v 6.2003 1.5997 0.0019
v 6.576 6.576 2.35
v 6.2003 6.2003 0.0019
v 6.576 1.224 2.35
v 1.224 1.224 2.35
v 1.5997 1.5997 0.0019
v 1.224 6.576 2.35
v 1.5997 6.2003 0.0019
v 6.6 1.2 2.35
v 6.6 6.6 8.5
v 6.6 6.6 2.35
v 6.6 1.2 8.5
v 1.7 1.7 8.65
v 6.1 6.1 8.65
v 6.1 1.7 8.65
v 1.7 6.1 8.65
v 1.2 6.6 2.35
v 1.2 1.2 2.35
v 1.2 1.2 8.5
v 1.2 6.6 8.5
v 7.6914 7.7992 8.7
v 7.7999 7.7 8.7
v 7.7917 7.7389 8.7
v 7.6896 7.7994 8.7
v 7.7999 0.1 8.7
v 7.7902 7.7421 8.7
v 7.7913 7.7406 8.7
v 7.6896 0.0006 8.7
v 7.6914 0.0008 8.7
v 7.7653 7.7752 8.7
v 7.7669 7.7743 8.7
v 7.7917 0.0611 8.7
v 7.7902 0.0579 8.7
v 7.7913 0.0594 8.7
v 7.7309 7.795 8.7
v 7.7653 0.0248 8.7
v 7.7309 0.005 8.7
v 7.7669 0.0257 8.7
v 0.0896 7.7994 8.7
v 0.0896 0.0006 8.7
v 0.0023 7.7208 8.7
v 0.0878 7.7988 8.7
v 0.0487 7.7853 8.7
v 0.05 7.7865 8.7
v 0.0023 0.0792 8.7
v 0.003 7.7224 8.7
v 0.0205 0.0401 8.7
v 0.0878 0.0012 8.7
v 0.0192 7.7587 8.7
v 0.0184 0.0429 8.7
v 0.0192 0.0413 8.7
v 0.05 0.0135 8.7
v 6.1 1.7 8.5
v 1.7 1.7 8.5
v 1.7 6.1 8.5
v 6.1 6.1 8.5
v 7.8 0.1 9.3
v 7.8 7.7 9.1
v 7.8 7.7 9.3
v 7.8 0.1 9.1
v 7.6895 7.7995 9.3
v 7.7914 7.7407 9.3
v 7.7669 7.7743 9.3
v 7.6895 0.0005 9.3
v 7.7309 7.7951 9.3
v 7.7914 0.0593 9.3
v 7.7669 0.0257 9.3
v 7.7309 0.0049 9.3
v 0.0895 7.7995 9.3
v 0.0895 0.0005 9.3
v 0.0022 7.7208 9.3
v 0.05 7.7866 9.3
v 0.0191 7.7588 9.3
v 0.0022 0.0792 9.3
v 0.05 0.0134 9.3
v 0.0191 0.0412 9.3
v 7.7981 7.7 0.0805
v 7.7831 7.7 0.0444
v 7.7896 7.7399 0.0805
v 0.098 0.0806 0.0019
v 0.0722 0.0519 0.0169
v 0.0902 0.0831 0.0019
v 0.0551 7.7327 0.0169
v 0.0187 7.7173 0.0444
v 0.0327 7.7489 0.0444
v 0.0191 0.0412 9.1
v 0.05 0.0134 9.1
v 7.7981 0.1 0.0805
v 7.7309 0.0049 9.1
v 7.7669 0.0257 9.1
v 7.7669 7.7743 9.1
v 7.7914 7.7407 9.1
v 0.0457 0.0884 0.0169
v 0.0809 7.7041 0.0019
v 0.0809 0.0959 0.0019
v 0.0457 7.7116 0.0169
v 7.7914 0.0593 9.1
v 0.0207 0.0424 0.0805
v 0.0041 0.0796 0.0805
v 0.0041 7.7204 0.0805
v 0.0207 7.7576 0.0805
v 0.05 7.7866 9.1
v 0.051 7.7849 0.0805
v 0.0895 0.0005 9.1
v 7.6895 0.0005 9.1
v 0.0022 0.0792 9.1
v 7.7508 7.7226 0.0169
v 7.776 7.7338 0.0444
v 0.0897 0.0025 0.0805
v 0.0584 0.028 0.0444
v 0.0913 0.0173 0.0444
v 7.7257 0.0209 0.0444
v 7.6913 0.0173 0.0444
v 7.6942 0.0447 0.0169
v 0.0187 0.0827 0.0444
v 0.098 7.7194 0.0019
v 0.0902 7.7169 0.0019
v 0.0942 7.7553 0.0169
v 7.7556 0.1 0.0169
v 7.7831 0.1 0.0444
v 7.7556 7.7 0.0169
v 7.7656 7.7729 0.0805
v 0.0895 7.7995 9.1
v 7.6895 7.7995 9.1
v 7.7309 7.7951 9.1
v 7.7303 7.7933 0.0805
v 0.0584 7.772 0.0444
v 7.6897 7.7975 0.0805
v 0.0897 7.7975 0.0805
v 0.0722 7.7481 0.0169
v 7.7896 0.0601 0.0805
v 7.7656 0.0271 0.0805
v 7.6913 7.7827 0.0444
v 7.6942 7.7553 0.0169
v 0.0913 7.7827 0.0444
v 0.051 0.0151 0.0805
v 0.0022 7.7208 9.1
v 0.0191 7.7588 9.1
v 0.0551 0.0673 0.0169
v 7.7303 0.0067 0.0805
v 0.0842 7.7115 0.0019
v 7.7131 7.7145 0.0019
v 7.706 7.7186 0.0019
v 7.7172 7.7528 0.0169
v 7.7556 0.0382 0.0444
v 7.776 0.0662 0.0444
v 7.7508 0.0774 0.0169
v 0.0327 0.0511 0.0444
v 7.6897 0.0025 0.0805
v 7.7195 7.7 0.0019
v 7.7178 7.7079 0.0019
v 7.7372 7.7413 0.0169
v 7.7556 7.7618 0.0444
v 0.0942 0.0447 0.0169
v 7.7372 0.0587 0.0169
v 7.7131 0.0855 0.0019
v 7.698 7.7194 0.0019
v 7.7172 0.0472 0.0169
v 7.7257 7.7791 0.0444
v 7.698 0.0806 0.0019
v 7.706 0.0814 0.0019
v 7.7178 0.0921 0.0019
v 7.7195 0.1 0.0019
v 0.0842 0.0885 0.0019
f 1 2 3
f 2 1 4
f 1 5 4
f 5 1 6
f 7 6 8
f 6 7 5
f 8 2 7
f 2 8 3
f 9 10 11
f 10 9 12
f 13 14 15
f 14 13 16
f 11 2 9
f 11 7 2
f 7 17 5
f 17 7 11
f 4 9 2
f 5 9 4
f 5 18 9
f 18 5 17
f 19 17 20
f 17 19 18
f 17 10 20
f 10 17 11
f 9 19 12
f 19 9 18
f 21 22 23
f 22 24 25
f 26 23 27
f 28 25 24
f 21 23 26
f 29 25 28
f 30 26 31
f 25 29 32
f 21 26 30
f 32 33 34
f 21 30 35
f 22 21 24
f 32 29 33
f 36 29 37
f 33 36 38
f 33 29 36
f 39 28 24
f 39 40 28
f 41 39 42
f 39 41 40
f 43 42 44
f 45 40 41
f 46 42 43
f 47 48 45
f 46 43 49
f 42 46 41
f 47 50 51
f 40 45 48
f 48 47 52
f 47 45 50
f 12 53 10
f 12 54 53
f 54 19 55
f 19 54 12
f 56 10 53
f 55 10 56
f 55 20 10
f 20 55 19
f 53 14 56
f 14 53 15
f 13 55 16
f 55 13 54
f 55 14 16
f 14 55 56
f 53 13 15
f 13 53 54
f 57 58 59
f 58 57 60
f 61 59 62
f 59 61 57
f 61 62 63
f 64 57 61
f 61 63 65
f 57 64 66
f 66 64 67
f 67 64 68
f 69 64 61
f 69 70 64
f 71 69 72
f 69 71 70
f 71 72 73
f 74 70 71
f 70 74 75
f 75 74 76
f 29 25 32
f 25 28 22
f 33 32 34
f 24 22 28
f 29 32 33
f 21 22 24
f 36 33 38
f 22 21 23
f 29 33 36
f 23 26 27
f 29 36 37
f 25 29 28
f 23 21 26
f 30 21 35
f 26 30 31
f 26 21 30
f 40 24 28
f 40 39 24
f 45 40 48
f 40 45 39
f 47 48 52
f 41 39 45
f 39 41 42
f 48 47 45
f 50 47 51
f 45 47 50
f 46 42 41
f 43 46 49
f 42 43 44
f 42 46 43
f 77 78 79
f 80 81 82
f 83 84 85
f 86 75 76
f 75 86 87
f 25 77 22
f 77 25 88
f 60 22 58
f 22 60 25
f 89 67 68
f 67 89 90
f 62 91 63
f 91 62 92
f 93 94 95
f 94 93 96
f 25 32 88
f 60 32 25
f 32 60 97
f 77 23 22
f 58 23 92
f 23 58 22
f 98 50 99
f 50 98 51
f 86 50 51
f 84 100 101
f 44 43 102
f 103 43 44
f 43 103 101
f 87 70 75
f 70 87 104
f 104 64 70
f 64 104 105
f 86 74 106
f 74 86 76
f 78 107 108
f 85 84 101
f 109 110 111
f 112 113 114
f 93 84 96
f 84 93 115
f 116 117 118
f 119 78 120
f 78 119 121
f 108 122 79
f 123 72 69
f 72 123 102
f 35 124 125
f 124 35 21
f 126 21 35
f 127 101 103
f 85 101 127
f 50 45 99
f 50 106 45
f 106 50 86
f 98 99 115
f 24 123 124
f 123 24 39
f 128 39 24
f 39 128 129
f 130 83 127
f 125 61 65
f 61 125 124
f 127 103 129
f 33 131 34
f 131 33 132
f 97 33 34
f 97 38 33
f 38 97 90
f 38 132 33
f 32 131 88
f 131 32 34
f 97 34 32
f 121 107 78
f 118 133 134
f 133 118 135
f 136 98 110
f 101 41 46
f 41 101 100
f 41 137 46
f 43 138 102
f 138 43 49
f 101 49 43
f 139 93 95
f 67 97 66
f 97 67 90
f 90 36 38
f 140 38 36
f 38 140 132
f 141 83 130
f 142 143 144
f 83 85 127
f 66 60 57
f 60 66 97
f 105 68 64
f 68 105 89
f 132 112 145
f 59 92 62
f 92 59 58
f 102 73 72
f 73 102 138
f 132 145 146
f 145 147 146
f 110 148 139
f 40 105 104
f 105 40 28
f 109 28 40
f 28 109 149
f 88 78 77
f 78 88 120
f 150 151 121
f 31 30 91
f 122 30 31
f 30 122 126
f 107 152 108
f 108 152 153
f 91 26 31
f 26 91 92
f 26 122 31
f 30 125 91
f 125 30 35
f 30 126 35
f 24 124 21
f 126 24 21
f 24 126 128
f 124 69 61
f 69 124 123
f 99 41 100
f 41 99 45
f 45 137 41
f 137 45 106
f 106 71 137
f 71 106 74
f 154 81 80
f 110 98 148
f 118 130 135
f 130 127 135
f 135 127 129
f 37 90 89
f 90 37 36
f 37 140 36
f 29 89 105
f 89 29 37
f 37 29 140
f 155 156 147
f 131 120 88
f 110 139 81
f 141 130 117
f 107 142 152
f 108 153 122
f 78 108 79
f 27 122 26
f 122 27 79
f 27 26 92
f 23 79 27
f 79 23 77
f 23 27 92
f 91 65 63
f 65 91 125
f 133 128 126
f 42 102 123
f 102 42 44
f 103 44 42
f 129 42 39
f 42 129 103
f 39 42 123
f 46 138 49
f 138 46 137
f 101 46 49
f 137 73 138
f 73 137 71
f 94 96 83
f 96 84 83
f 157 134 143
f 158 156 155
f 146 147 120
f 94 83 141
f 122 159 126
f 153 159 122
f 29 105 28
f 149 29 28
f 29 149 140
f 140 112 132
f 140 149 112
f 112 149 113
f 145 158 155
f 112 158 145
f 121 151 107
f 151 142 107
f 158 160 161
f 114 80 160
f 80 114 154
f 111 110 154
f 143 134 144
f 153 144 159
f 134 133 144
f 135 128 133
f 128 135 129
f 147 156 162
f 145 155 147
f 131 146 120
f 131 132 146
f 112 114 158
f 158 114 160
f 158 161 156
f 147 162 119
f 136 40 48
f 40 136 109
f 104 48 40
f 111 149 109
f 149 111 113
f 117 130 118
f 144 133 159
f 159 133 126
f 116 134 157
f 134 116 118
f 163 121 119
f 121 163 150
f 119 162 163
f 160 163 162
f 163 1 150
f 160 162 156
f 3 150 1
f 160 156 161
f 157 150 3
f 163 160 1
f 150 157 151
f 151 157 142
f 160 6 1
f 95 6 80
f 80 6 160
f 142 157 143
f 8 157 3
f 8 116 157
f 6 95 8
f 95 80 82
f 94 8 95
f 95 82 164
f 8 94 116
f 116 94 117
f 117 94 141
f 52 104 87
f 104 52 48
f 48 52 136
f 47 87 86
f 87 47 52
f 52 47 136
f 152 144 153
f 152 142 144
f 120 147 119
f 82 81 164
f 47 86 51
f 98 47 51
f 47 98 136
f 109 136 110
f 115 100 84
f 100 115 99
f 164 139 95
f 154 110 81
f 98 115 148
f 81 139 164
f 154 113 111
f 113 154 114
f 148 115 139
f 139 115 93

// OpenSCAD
// file: ../../lib/brick-hollow.scad
/**
* Machine Blocks
* https://machinemania.net/blocks 
*
* Brick Hollow
* Copyright (c) 2022 Jan Philipp Knoeller <pk@pksoftware.de>
*
* Published under license:
* Creative Commons Attribution-NonCommercial-ShareAlike 4.0 International 
* https://creativecommons.org/licenses/by-nc-sa/4.0/
*
*/
echo(version=version());

module brickHollow(height=9.3, fade=2.5, minSize=[4.6,4.6], maxSize=[5.2, 5.2], center = false){
    echo(height, minSize, maxSize, fade);
    sizeX = max(minSize[0],maxSize[0]); 
   sizeY = max(minSize[1],maxSize[1]); 
    
    posX = center ? 0 : 0.5*sizeX; 
   posY = center ? 0 : 0.5*sizeY;   
   posZ = center ? -0.5 * (height-fade) : 0.5*fade;
    
    cutHelper = 0.2;
    overlapSpace=0.1;
    
    translate([posX, posY, posZ]){
        union(){
            polyhedron(points=[
                [-0.5*minSize[0],-0.5*minSize[1],-0.5*fade],
                [0.5*minSize[0],-0.5*minSize[1],-0.5*fade],
                [0.5*minSize[0],0.5*minSize[1],-0.5*fade],
                [-0.5*minSize[0],0.5*minSize[1],-0.5*fade],
                [-0.5*maxSize[0],-0.5*maxSize[1],0.5*fade],
                [0.5*maxSize[0],-0.5*maxSize[1],0.5*fade],
                [0.5*maxSize[0],0.5*maxSize[1],0.5*fade],
                [-0.5*maxSize[0],0.5*maxSize[1],0.5*fade]
            ], faces=[[0,1,2,3],[1,0,4,5],[2,1,5,6],[3,2,6,7],[0,3,7,4],[7,6,5,4]]);
            
            if(height > fade){
                translate([0,0,0.5*height - overlapSpace]){
                    cube([maxSize[0], maxSize[1], height - fade + overlapSpace], center=true);
                }
            }
            
            translate([0,0,-0.5*(fade + cutHelper) + overlapSpace]){
                cube([minSize[0], minSize[1], cutHelper + overlapSpace], center=true);
            }
        }
    }
}

//brickHollow(height=9.3, maxSize=[5.2,5.2], minSize=[4.6,4.6], center=true);
// file: ../../lib/roundedcube_simple.scad
/**
* Machine Blocks
* https://machinemania.net/blocks 
*
* Module for simple rounded cubes
* Copyright (c) 2022 Jan Philipp Knoeller <pk@pksoftware.de>
*
* Published under license:
* Creative Commons Attribution-NonCommercial-ShareAlike 4.0 International 
* https://creativecommons.org/licenses/by-nc-sa/4.0/
*
*/
module roundedcube_simple(size = [1, 1, 1], center = false, radius = 0.5, resolution = 20) {
	// If single value, convert to [x, y, z] vector
	size = (size[0] == undef) ? [size, size, size] : size;

	translate = (center == false) ?
		[radius, radius, radius] :
		[
			radius - (size[0] / 2),
			radius - (size[1] / 2),
			radius - (size[2] / 2)
	];

	translate(v = translate)
	minkowski() {
		cube(size = [
			size[0] - (radius * 2),
			size[1] - (radius * 2),
			size[2] - (radius * 2)
		]);
		sphere(r = radius, $fn = resolution);
	}
}
// file: ../../lib/roundedcube.scad
// More information: https://danielupshaw.com/openscad-rounded-corners/

// Set to 0.01 for higher definition curves (renders slower)
$fs = 0.15;

module roundedcube(size = [1, 1, 1], center = false, radius = 0.5, apply_to = "all", resolution = 20) {
	// If single value, convert to [x, y, z] vector
	size = (size[0] == undef) ? [size, size, size] : size;

	translate_min = radius;
	translate_xmax = size[0] - radius;
	translate_ymax = size[1] - radius;
	translate_zmax = size[2] - radius;

	diameter = radius * 2;

	obj_translate = (center == false) ?
		[0, 0, 0] : [
			-(size[0] / 2),
			-(size[1] / 2),
			-(size[2] / 2)
		];

	translate(v = obj_translate) {
		hull() {
			for (translate_x = [translate_min, translate_xmax]) {
				x_at = (translate_x == translate_min) ? "min" : "max";
				for (translate_y = [translate_min, translate_ymax]) {
					y_at = (translate_y == translate_min) ? "min" : "max";
					for (translate_z = [translate_min, translate_zmax]) {
						z_at = (translate_z == translate_min) ? "min" : "max";

						translate(v = [translate_x, translate_y, translate_z])
						if (
							(apply_to == "all") ||
							(apply_to == "xmin" && x_at == "min") || (apply_to == "xmax" && x_at == "max") ||
							(apply_to == "ymin" && y_at == "min") || (apply_to == "ymax" && y_at == "max") ||
							(apply_to == "zmin" && z_at == "min") || (apply_to == "zmax" && z_at == "max")
						) {
							sphere(r = radius, $fn = resolution);
						} else {
							rotate = 
								(apply_to == "xmin" || apply_to == "xmax" || apply_to == "x") ? [0, 90, 0] : (
								(apply_to == "ymin" || apply_to == "ymax" || apply_to == "y") ? [90, 90, 0] :
								[0, 0, 0]
							);
							rotate(a = rotate)
							cylinder(h = diameter, r = radius, center = true, $fn = resolution);
						}
					}
				}
			}
		}
	}
}
// main file
/**
* Machine Blocks
* https://machinemania.net/blocks 
*
* Brick 1x1 without knobs
* Copyright (c) 2022 Jan Philipp Knoeller <pk@pksoftware.de>
*
* Published under license:
* Creative Commons Attribution-NonCommercial-ShareAlike 4.0 International 
* https://creativecommons.org/licenses/by-nc-sa/4.0/
*
*/

echo(version=version());

include <../../lib/block-v2.scad>;

block(baseLayers=3, grid=[1,1], withKnobs=false);
